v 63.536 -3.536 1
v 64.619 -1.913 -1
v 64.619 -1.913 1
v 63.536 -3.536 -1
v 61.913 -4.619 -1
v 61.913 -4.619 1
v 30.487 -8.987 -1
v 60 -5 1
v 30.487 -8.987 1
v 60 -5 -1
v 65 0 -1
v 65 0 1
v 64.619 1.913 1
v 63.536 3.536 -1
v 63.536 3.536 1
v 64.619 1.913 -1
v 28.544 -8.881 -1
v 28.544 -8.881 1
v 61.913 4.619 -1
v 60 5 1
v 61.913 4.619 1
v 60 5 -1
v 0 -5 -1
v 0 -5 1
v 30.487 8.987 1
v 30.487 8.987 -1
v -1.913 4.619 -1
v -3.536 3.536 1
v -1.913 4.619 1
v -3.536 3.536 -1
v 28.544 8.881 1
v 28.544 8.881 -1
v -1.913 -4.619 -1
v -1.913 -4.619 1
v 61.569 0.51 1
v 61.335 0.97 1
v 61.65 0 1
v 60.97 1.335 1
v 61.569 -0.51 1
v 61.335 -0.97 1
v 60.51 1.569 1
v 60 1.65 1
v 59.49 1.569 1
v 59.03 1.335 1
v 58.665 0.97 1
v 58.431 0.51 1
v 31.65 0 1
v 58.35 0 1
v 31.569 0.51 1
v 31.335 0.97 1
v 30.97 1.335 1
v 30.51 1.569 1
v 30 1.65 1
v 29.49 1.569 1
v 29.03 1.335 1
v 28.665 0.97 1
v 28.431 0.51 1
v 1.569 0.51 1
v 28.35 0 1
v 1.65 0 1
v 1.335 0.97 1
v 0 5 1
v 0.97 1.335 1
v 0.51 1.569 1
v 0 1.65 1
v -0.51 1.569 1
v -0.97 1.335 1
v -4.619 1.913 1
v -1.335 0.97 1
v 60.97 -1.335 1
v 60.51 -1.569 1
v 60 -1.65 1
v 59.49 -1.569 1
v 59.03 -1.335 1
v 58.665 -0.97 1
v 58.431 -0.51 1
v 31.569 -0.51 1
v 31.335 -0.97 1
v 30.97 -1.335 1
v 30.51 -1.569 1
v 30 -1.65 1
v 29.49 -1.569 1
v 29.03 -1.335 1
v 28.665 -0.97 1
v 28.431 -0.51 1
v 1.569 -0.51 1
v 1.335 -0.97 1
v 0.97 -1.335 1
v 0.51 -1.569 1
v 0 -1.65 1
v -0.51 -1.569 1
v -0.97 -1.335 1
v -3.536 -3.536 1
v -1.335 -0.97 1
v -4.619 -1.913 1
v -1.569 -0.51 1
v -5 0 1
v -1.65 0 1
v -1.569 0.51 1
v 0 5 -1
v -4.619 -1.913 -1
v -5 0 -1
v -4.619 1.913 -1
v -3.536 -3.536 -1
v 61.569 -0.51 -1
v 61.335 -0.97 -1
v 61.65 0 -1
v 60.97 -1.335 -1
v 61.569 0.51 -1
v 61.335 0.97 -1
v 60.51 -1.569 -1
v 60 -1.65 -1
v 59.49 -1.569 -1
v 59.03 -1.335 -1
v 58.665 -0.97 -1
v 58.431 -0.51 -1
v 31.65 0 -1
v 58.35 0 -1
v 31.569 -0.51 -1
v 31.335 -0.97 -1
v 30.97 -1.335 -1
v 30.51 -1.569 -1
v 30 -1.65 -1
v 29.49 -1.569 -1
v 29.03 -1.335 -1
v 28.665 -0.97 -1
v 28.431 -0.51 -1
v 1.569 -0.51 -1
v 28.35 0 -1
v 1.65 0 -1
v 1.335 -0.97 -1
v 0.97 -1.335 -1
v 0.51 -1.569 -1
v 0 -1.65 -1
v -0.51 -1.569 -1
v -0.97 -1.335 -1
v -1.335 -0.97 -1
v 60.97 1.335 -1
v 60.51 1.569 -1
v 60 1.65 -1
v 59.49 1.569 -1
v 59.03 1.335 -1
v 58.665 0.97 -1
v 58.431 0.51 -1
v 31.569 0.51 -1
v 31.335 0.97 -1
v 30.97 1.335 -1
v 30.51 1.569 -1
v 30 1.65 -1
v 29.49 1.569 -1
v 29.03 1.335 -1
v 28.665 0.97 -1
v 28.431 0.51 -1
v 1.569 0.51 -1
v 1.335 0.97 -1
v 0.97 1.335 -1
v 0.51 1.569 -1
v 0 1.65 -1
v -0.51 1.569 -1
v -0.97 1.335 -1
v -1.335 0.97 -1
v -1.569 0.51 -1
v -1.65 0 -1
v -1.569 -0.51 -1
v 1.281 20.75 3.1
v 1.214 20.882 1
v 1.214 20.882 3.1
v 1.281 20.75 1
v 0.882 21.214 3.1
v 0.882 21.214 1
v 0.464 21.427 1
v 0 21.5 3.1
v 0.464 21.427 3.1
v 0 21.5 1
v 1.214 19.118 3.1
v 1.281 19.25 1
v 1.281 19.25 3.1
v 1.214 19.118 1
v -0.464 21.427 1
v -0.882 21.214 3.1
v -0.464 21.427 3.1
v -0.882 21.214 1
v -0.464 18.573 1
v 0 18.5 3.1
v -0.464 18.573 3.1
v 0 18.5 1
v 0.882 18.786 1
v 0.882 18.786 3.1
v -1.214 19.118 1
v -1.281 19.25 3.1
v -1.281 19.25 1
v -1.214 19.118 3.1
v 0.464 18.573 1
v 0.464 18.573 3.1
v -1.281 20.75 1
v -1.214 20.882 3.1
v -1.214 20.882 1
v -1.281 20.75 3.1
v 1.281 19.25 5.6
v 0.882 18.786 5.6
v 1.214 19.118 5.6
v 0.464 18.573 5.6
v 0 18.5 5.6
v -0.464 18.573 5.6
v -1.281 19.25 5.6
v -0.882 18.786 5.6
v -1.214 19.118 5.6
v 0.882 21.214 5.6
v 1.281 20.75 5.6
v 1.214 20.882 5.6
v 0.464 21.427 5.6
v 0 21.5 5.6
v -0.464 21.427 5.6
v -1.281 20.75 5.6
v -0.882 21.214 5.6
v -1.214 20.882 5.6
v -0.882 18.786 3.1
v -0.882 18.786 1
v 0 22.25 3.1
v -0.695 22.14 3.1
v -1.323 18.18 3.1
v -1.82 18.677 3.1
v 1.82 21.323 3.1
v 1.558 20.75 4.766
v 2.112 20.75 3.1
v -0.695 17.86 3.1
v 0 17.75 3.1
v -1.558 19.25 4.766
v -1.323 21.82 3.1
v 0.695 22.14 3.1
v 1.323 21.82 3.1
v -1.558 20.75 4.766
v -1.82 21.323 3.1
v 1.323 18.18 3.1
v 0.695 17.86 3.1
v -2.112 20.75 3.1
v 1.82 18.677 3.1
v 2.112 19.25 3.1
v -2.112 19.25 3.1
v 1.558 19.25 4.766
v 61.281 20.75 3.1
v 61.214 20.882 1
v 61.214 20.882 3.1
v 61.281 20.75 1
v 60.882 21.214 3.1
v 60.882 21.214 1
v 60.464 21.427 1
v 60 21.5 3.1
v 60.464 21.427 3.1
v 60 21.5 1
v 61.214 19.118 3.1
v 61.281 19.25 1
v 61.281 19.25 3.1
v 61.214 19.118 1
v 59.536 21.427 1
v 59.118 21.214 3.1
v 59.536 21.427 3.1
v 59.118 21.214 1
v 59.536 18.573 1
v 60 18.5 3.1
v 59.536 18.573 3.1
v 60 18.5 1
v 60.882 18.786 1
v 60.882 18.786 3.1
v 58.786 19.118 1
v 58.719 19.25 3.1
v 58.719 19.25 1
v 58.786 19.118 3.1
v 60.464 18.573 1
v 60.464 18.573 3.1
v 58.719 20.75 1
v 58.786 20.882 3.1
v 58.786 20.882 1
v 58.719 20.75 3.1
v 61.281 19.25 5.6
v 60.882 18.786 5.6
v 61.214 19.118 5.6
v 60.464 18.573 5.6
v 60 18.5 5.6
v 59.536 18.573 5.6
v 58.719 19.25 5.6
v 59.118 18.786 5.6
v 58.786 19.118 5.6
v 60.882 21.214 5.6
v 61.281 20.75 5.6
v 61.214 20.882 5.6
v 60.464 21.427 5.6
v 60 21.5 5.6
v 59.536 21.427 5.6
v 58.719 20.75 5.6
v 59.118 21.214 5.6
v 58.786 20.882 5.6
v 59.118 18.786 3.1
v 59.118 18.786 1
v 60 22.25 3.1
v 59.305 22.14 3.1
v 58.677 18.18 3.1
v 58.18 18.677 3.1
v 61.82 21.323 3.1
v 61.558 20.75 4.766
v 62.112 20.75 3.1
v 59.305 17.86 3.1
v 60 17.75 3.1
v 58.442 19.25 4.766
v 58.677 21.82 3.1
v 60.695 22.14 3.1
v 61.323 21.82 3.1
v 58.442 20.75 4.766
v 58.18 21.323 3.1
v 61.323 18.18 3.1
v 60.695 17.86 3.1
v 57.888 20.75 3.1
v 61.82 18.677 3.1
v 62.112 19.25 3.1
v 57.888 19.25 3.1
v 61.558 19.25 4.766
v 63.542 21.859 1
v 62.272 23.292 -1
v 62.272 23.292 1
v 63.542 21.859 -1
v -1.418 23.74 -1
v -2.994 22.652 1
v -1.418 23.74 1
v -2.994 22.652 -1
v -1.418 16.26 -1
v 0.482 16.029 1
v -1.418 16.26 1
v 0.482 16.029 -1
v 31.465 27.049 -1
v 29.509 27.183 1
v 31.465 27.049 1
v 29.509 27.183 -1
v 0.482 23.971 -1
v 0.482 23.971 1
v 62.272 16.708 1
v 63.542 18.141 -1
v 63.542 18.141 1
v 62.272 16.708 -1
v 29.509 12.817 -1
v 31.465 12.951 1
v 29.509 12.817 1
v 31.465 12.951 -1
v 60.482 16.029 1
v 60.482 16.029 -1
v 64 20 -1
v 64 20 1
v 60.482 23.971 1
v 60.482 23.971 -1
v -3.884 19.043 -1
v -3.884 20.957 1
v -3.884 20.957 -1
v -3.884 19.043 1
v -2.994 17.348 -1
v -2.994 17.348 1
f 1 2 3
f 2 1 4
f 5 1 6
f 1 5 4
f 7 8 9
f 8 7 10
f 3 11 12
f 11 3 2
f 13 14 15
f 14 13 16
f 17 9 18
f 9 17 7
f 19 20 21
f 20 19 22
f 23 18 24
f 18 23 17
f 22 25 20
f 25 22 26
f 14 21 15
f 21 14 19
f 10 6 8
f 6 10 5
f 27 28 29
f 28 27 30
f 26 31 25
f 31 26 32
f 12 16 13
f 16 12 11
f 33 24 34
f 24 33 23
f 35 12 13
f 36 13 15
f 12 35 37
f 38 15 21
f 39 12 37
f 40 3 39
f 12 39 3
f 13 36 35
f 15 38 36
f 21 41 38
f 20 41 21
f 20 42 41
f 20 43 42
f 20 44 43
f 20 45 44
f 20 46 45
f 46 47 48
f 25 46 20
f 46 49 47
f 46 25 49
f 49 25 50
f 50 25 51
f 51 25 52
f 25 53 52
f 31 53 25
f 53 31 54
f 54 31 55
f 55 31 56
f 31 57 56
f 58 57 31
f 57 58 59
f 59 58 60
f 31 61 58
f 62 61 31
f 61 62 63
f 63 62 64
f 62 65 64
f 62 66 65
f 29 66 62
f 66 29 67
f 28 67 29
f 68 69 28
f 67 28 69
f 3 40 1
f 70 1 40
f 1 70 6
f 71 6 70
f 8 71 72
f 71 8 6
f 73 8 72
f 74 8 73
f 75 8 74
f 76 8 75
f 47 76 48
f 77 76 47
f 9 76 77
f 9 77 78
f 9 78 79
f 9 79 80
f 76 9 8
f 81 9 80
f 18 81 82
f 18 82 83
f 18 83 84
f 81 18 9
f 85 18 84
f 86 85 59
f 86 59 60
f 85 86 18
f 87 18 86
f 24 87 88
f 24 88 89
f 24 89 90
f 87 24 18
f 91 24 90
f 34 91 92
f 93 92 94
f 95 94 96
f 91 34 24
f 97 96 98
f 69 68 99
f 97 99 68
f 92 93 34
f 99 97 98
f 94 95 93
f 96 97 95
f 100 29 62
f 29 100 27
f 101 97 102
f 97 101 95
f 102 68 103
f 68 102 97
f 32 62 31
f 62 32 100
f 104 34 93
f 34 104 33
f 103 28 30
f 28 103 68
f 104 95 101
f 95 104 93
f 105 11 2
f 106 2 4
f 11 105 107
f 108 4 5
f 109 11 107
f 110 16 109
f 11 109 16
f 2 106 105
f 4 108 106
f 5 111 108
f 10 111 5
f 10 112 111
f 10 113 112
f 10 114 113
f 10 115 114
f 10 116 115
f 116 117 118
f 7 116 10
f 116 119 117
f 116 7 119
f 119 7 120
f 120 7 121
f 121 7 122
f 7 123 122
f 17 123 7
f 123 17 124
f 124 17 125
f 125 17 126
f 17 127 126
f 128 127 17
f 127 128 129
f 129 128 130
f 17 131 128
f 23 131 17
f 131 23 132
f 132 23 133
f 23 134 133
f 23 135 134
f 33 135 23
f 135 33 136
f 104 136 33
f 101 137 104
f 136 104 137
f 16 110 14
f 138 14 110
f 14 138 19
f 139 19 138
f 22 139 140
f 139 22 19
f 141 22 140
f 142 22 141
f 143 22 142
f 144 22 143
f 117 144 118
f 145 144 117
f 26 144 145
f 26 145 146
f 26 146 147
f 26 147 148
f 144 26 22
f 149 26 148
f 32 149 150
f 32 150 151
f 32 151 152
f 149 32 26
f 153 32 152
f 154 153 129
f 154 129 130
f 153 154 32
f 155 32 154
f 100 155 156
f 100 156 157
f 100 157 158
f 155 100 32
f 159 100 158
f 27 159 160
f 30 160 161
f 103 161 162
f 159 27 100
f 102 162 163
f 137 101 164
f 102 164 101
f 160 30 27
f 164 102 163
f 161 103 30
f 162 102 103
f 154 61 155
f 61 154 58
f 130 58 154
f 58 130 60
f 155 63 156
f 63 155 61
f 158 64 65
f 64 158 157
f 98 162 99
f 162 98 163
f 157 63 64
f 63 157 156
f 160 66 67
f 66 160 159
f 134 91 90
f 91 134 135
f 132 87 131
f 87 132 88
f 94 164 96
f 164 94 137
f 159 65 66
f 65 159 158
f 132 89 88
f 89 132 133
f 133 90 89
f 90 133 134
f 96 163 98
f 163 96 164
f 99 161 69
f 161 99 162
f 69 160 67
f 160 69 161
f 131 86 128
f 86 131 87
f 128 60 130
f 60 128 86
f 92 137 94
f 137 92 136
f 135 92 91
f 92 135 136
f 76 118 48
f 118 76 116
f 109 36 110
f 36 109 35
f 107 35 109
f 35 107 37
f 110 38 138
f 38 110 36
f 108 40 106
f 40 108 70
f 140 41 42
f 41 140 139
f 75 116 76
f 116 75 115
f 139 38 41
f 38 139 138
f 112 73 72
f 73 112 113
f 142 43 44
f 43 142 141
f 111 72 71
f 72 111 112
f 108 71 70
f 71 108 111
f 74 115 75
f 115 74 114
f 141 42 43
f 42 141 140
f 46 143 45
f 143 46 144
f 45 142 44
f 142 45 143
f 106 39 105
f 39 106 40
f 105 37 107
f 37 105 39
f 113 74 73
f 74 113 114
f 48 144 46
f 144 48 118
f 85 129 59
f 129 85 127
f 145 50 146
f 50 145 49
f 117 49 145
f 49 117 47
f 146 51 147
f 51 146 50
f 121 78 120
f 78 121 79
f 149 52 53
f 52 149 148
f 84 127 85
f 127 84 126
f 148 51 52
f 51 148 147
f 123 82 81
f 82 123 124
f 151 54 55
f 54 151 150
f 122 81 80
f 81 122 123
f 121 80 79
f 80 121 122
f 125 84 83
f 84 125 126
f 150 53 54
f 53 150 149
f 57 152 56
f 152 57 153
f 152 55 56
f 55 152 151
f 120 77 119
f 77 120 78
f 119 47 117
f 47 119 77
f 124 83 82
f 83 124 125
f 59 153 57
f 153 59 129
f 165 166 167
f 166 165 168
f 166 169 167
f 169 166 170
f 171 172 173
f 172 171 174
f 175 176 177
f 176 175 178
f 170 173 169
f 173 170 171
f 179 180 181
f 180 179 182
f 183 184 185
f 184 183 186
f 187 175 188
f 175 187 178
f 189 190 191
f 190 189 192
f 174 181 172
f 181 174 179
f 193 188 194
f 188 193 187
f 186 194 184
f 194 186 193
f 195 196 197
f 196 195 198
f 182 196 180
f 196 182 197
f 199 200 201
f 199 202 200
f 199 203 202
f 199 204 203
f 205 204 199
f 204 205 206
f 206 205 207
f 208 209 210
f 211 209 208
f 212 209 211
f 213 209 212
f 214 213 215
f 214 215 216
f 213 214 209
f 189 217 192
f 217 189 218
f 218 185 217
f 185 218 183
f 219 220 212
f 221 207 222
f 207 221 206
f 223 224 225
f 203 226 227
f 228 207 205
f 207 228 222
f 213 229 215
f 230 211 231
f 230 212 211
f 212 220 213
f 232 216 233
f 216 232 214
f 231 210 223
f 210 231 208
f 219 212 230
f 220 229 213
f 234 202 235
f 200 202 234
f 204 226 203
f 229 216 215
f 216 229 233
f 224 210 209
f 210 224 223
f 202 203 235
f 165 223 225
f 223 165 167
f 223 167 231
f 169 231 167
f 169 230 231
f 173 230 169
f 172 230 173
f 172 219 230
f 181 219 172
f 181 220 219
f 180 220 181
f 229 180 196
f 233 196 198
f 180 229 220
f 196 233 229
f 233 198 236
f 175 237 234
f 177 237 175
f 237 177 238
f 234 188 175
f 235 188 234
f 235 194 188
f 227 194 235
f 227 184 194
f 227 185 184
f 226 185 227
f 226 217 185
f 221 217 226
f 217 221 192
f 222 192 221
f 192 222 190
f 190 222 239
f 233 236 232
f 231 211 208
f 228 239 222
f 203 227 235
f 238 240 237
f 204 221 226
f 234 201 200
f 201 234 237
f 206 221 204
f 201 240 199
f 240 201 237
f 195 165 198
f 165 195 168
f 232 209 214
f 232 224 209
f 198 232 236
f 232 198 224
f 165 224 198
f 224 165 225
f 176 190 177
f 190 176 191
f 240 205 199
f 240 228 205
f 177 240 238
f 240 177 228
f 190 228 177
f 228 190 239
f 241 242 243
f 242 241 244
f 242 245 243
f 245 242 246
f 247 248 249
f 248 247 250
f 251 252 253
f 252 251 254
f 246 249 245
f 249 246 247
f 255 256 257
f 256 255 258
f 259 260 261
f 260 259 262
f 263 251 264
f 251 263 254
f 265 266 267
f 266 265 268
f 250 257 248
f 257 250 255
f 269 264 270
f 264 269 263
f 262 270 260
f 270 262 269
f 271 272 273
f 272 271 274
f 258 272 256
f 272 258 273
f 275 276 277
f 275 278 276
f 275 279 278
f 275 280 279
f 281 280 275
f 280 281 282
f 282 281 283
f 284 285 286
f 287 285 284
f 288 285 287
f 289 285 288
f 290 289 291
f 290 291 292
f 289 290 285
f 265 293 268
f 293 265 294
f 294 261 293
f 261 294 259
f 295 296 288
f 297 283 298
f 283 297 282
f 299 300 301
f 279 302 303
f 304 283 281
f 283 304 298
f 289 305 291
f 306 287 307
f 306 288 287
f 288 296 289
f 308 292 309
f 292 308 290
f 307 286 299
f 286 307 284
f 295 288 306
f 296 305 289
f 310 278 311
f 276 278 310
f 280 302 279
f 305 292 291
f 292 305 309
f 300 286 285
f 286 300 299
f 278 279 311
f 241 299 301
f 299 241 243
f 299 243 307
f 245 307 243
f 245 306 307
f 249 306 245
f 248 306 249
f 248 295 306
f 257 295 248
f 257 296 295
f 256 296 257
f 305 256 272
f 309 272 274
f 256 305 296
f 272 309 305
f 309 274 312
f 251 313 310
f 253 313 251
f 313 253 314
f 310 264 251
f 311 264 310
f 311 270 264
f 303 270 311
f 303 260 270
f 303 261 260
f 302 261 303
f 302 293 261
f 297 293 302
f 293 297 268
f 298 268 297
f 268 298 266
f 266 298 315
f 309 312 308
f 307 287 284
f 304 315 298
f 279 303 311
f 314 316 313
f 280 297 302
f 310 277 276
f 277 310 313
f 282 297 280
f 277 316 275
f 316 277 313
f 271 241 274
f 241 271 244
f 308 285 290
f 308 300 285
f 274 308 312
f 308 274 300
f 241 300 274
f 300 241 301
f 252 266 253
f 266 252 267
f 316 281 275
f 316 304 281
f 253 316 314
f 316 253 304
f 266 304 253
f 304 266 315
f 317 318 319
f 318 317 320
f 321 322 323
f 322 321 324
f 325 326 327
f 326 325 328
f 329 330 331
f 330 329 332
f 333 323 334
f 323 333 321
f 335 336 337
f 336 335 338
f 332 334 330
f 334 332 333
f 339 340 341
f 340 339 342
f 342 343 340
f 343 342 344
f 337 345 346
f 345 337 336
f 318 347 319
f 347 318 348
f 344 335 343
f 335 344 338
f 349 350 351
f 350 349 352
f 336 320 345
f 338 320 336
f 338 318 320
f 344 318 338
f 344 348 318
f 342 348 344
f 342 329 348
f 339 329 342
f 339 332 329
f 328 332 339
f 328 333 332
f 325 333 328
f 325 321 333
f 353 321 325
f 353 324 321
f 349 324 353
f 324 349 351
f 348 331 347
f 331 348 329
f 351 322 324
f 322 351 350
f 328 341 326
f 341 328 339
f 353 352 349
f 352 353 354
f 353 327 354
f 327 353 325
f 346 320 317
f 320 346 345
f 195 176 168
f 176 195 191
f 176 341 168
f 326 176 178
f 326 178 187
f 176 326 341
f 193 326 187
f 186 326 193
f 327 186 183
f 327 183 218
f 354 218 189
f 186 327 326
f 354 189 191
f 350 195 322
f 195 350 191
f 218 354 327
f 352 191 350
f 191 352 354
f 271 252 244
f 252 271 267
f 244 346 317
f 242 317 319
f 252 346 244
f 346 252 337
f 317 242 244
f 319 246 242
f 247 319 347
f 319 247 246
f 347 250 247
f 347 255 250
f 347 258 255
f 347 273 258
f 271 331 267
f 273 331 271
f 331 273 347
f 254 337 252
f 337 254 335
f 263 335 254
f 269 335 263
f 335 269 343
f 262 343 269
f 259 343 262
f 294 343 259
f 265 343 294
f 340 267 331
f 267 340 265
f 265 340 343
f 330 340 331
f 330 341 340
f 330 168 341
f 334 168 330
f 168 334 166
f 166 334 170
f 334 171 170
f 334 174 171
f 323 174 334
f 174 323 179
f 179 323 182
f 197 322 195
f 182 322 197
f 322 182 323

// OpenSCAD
//Hull test
clearance=0.6;

module beam(length,width,height,hole) {
	difference() {
		//Body
		hull(){
		cylinder(d=width,h=height,center=true);
		translate([length/2,0,0])
			cylinder(d=width*1.8,h=height,center=true);
		translate([length,0,0])
			cylinder(d=width,h=height,center=true);	
		};
		//Holes
		cylinder(d=hole+clearance/2,h=height*1.5,center=true,$fn=20);
		translate([length,0,0])
			cylinder(d=hole+clearance/2,h=height*1.5,center=true,$fn=20);
		translate([length/2,0,0])
			cylinder(d=hole+clearance/2,h=height*1.5,center=true,$fn=20);
	}
}

module rivet(length,diameter) {
//Length excludes that of clips, it's the lenght of the part that passes through
		head = 2.5;
		hdiameter = diameter + 1.5;
		difference() {
			union() {
				cylinder(d=diameter,h=length+clearance,$fn=20);
				translate([0,0,length-head+clearance])
					cylinder(r2=(diameter/2),r1=(hdiameter/2),h=head,$fn=20);	
				}
				translate([-diameter,-diameter/4,length-head-2])
					cube([diameter*2,diameter/2,head*3]);
		}
		
}

module beam2(length,width,height) {
		//Body
		union() {
			hull(){
			cylinder(d=width,h=height,center=true);
			translate([length/2,0,0])
				cylinder(d=width*1.8,h=height,center=true);
			translate([length,0,0])
				cylinder(d=width,h=height,center=true);	
			};
			rivet(5,3);
			translate([length,0,0])
				rivet(5,3);
		}
}

beam(60,10,2,3);
translate([0,20,0])
		beam2(60,8,2);
